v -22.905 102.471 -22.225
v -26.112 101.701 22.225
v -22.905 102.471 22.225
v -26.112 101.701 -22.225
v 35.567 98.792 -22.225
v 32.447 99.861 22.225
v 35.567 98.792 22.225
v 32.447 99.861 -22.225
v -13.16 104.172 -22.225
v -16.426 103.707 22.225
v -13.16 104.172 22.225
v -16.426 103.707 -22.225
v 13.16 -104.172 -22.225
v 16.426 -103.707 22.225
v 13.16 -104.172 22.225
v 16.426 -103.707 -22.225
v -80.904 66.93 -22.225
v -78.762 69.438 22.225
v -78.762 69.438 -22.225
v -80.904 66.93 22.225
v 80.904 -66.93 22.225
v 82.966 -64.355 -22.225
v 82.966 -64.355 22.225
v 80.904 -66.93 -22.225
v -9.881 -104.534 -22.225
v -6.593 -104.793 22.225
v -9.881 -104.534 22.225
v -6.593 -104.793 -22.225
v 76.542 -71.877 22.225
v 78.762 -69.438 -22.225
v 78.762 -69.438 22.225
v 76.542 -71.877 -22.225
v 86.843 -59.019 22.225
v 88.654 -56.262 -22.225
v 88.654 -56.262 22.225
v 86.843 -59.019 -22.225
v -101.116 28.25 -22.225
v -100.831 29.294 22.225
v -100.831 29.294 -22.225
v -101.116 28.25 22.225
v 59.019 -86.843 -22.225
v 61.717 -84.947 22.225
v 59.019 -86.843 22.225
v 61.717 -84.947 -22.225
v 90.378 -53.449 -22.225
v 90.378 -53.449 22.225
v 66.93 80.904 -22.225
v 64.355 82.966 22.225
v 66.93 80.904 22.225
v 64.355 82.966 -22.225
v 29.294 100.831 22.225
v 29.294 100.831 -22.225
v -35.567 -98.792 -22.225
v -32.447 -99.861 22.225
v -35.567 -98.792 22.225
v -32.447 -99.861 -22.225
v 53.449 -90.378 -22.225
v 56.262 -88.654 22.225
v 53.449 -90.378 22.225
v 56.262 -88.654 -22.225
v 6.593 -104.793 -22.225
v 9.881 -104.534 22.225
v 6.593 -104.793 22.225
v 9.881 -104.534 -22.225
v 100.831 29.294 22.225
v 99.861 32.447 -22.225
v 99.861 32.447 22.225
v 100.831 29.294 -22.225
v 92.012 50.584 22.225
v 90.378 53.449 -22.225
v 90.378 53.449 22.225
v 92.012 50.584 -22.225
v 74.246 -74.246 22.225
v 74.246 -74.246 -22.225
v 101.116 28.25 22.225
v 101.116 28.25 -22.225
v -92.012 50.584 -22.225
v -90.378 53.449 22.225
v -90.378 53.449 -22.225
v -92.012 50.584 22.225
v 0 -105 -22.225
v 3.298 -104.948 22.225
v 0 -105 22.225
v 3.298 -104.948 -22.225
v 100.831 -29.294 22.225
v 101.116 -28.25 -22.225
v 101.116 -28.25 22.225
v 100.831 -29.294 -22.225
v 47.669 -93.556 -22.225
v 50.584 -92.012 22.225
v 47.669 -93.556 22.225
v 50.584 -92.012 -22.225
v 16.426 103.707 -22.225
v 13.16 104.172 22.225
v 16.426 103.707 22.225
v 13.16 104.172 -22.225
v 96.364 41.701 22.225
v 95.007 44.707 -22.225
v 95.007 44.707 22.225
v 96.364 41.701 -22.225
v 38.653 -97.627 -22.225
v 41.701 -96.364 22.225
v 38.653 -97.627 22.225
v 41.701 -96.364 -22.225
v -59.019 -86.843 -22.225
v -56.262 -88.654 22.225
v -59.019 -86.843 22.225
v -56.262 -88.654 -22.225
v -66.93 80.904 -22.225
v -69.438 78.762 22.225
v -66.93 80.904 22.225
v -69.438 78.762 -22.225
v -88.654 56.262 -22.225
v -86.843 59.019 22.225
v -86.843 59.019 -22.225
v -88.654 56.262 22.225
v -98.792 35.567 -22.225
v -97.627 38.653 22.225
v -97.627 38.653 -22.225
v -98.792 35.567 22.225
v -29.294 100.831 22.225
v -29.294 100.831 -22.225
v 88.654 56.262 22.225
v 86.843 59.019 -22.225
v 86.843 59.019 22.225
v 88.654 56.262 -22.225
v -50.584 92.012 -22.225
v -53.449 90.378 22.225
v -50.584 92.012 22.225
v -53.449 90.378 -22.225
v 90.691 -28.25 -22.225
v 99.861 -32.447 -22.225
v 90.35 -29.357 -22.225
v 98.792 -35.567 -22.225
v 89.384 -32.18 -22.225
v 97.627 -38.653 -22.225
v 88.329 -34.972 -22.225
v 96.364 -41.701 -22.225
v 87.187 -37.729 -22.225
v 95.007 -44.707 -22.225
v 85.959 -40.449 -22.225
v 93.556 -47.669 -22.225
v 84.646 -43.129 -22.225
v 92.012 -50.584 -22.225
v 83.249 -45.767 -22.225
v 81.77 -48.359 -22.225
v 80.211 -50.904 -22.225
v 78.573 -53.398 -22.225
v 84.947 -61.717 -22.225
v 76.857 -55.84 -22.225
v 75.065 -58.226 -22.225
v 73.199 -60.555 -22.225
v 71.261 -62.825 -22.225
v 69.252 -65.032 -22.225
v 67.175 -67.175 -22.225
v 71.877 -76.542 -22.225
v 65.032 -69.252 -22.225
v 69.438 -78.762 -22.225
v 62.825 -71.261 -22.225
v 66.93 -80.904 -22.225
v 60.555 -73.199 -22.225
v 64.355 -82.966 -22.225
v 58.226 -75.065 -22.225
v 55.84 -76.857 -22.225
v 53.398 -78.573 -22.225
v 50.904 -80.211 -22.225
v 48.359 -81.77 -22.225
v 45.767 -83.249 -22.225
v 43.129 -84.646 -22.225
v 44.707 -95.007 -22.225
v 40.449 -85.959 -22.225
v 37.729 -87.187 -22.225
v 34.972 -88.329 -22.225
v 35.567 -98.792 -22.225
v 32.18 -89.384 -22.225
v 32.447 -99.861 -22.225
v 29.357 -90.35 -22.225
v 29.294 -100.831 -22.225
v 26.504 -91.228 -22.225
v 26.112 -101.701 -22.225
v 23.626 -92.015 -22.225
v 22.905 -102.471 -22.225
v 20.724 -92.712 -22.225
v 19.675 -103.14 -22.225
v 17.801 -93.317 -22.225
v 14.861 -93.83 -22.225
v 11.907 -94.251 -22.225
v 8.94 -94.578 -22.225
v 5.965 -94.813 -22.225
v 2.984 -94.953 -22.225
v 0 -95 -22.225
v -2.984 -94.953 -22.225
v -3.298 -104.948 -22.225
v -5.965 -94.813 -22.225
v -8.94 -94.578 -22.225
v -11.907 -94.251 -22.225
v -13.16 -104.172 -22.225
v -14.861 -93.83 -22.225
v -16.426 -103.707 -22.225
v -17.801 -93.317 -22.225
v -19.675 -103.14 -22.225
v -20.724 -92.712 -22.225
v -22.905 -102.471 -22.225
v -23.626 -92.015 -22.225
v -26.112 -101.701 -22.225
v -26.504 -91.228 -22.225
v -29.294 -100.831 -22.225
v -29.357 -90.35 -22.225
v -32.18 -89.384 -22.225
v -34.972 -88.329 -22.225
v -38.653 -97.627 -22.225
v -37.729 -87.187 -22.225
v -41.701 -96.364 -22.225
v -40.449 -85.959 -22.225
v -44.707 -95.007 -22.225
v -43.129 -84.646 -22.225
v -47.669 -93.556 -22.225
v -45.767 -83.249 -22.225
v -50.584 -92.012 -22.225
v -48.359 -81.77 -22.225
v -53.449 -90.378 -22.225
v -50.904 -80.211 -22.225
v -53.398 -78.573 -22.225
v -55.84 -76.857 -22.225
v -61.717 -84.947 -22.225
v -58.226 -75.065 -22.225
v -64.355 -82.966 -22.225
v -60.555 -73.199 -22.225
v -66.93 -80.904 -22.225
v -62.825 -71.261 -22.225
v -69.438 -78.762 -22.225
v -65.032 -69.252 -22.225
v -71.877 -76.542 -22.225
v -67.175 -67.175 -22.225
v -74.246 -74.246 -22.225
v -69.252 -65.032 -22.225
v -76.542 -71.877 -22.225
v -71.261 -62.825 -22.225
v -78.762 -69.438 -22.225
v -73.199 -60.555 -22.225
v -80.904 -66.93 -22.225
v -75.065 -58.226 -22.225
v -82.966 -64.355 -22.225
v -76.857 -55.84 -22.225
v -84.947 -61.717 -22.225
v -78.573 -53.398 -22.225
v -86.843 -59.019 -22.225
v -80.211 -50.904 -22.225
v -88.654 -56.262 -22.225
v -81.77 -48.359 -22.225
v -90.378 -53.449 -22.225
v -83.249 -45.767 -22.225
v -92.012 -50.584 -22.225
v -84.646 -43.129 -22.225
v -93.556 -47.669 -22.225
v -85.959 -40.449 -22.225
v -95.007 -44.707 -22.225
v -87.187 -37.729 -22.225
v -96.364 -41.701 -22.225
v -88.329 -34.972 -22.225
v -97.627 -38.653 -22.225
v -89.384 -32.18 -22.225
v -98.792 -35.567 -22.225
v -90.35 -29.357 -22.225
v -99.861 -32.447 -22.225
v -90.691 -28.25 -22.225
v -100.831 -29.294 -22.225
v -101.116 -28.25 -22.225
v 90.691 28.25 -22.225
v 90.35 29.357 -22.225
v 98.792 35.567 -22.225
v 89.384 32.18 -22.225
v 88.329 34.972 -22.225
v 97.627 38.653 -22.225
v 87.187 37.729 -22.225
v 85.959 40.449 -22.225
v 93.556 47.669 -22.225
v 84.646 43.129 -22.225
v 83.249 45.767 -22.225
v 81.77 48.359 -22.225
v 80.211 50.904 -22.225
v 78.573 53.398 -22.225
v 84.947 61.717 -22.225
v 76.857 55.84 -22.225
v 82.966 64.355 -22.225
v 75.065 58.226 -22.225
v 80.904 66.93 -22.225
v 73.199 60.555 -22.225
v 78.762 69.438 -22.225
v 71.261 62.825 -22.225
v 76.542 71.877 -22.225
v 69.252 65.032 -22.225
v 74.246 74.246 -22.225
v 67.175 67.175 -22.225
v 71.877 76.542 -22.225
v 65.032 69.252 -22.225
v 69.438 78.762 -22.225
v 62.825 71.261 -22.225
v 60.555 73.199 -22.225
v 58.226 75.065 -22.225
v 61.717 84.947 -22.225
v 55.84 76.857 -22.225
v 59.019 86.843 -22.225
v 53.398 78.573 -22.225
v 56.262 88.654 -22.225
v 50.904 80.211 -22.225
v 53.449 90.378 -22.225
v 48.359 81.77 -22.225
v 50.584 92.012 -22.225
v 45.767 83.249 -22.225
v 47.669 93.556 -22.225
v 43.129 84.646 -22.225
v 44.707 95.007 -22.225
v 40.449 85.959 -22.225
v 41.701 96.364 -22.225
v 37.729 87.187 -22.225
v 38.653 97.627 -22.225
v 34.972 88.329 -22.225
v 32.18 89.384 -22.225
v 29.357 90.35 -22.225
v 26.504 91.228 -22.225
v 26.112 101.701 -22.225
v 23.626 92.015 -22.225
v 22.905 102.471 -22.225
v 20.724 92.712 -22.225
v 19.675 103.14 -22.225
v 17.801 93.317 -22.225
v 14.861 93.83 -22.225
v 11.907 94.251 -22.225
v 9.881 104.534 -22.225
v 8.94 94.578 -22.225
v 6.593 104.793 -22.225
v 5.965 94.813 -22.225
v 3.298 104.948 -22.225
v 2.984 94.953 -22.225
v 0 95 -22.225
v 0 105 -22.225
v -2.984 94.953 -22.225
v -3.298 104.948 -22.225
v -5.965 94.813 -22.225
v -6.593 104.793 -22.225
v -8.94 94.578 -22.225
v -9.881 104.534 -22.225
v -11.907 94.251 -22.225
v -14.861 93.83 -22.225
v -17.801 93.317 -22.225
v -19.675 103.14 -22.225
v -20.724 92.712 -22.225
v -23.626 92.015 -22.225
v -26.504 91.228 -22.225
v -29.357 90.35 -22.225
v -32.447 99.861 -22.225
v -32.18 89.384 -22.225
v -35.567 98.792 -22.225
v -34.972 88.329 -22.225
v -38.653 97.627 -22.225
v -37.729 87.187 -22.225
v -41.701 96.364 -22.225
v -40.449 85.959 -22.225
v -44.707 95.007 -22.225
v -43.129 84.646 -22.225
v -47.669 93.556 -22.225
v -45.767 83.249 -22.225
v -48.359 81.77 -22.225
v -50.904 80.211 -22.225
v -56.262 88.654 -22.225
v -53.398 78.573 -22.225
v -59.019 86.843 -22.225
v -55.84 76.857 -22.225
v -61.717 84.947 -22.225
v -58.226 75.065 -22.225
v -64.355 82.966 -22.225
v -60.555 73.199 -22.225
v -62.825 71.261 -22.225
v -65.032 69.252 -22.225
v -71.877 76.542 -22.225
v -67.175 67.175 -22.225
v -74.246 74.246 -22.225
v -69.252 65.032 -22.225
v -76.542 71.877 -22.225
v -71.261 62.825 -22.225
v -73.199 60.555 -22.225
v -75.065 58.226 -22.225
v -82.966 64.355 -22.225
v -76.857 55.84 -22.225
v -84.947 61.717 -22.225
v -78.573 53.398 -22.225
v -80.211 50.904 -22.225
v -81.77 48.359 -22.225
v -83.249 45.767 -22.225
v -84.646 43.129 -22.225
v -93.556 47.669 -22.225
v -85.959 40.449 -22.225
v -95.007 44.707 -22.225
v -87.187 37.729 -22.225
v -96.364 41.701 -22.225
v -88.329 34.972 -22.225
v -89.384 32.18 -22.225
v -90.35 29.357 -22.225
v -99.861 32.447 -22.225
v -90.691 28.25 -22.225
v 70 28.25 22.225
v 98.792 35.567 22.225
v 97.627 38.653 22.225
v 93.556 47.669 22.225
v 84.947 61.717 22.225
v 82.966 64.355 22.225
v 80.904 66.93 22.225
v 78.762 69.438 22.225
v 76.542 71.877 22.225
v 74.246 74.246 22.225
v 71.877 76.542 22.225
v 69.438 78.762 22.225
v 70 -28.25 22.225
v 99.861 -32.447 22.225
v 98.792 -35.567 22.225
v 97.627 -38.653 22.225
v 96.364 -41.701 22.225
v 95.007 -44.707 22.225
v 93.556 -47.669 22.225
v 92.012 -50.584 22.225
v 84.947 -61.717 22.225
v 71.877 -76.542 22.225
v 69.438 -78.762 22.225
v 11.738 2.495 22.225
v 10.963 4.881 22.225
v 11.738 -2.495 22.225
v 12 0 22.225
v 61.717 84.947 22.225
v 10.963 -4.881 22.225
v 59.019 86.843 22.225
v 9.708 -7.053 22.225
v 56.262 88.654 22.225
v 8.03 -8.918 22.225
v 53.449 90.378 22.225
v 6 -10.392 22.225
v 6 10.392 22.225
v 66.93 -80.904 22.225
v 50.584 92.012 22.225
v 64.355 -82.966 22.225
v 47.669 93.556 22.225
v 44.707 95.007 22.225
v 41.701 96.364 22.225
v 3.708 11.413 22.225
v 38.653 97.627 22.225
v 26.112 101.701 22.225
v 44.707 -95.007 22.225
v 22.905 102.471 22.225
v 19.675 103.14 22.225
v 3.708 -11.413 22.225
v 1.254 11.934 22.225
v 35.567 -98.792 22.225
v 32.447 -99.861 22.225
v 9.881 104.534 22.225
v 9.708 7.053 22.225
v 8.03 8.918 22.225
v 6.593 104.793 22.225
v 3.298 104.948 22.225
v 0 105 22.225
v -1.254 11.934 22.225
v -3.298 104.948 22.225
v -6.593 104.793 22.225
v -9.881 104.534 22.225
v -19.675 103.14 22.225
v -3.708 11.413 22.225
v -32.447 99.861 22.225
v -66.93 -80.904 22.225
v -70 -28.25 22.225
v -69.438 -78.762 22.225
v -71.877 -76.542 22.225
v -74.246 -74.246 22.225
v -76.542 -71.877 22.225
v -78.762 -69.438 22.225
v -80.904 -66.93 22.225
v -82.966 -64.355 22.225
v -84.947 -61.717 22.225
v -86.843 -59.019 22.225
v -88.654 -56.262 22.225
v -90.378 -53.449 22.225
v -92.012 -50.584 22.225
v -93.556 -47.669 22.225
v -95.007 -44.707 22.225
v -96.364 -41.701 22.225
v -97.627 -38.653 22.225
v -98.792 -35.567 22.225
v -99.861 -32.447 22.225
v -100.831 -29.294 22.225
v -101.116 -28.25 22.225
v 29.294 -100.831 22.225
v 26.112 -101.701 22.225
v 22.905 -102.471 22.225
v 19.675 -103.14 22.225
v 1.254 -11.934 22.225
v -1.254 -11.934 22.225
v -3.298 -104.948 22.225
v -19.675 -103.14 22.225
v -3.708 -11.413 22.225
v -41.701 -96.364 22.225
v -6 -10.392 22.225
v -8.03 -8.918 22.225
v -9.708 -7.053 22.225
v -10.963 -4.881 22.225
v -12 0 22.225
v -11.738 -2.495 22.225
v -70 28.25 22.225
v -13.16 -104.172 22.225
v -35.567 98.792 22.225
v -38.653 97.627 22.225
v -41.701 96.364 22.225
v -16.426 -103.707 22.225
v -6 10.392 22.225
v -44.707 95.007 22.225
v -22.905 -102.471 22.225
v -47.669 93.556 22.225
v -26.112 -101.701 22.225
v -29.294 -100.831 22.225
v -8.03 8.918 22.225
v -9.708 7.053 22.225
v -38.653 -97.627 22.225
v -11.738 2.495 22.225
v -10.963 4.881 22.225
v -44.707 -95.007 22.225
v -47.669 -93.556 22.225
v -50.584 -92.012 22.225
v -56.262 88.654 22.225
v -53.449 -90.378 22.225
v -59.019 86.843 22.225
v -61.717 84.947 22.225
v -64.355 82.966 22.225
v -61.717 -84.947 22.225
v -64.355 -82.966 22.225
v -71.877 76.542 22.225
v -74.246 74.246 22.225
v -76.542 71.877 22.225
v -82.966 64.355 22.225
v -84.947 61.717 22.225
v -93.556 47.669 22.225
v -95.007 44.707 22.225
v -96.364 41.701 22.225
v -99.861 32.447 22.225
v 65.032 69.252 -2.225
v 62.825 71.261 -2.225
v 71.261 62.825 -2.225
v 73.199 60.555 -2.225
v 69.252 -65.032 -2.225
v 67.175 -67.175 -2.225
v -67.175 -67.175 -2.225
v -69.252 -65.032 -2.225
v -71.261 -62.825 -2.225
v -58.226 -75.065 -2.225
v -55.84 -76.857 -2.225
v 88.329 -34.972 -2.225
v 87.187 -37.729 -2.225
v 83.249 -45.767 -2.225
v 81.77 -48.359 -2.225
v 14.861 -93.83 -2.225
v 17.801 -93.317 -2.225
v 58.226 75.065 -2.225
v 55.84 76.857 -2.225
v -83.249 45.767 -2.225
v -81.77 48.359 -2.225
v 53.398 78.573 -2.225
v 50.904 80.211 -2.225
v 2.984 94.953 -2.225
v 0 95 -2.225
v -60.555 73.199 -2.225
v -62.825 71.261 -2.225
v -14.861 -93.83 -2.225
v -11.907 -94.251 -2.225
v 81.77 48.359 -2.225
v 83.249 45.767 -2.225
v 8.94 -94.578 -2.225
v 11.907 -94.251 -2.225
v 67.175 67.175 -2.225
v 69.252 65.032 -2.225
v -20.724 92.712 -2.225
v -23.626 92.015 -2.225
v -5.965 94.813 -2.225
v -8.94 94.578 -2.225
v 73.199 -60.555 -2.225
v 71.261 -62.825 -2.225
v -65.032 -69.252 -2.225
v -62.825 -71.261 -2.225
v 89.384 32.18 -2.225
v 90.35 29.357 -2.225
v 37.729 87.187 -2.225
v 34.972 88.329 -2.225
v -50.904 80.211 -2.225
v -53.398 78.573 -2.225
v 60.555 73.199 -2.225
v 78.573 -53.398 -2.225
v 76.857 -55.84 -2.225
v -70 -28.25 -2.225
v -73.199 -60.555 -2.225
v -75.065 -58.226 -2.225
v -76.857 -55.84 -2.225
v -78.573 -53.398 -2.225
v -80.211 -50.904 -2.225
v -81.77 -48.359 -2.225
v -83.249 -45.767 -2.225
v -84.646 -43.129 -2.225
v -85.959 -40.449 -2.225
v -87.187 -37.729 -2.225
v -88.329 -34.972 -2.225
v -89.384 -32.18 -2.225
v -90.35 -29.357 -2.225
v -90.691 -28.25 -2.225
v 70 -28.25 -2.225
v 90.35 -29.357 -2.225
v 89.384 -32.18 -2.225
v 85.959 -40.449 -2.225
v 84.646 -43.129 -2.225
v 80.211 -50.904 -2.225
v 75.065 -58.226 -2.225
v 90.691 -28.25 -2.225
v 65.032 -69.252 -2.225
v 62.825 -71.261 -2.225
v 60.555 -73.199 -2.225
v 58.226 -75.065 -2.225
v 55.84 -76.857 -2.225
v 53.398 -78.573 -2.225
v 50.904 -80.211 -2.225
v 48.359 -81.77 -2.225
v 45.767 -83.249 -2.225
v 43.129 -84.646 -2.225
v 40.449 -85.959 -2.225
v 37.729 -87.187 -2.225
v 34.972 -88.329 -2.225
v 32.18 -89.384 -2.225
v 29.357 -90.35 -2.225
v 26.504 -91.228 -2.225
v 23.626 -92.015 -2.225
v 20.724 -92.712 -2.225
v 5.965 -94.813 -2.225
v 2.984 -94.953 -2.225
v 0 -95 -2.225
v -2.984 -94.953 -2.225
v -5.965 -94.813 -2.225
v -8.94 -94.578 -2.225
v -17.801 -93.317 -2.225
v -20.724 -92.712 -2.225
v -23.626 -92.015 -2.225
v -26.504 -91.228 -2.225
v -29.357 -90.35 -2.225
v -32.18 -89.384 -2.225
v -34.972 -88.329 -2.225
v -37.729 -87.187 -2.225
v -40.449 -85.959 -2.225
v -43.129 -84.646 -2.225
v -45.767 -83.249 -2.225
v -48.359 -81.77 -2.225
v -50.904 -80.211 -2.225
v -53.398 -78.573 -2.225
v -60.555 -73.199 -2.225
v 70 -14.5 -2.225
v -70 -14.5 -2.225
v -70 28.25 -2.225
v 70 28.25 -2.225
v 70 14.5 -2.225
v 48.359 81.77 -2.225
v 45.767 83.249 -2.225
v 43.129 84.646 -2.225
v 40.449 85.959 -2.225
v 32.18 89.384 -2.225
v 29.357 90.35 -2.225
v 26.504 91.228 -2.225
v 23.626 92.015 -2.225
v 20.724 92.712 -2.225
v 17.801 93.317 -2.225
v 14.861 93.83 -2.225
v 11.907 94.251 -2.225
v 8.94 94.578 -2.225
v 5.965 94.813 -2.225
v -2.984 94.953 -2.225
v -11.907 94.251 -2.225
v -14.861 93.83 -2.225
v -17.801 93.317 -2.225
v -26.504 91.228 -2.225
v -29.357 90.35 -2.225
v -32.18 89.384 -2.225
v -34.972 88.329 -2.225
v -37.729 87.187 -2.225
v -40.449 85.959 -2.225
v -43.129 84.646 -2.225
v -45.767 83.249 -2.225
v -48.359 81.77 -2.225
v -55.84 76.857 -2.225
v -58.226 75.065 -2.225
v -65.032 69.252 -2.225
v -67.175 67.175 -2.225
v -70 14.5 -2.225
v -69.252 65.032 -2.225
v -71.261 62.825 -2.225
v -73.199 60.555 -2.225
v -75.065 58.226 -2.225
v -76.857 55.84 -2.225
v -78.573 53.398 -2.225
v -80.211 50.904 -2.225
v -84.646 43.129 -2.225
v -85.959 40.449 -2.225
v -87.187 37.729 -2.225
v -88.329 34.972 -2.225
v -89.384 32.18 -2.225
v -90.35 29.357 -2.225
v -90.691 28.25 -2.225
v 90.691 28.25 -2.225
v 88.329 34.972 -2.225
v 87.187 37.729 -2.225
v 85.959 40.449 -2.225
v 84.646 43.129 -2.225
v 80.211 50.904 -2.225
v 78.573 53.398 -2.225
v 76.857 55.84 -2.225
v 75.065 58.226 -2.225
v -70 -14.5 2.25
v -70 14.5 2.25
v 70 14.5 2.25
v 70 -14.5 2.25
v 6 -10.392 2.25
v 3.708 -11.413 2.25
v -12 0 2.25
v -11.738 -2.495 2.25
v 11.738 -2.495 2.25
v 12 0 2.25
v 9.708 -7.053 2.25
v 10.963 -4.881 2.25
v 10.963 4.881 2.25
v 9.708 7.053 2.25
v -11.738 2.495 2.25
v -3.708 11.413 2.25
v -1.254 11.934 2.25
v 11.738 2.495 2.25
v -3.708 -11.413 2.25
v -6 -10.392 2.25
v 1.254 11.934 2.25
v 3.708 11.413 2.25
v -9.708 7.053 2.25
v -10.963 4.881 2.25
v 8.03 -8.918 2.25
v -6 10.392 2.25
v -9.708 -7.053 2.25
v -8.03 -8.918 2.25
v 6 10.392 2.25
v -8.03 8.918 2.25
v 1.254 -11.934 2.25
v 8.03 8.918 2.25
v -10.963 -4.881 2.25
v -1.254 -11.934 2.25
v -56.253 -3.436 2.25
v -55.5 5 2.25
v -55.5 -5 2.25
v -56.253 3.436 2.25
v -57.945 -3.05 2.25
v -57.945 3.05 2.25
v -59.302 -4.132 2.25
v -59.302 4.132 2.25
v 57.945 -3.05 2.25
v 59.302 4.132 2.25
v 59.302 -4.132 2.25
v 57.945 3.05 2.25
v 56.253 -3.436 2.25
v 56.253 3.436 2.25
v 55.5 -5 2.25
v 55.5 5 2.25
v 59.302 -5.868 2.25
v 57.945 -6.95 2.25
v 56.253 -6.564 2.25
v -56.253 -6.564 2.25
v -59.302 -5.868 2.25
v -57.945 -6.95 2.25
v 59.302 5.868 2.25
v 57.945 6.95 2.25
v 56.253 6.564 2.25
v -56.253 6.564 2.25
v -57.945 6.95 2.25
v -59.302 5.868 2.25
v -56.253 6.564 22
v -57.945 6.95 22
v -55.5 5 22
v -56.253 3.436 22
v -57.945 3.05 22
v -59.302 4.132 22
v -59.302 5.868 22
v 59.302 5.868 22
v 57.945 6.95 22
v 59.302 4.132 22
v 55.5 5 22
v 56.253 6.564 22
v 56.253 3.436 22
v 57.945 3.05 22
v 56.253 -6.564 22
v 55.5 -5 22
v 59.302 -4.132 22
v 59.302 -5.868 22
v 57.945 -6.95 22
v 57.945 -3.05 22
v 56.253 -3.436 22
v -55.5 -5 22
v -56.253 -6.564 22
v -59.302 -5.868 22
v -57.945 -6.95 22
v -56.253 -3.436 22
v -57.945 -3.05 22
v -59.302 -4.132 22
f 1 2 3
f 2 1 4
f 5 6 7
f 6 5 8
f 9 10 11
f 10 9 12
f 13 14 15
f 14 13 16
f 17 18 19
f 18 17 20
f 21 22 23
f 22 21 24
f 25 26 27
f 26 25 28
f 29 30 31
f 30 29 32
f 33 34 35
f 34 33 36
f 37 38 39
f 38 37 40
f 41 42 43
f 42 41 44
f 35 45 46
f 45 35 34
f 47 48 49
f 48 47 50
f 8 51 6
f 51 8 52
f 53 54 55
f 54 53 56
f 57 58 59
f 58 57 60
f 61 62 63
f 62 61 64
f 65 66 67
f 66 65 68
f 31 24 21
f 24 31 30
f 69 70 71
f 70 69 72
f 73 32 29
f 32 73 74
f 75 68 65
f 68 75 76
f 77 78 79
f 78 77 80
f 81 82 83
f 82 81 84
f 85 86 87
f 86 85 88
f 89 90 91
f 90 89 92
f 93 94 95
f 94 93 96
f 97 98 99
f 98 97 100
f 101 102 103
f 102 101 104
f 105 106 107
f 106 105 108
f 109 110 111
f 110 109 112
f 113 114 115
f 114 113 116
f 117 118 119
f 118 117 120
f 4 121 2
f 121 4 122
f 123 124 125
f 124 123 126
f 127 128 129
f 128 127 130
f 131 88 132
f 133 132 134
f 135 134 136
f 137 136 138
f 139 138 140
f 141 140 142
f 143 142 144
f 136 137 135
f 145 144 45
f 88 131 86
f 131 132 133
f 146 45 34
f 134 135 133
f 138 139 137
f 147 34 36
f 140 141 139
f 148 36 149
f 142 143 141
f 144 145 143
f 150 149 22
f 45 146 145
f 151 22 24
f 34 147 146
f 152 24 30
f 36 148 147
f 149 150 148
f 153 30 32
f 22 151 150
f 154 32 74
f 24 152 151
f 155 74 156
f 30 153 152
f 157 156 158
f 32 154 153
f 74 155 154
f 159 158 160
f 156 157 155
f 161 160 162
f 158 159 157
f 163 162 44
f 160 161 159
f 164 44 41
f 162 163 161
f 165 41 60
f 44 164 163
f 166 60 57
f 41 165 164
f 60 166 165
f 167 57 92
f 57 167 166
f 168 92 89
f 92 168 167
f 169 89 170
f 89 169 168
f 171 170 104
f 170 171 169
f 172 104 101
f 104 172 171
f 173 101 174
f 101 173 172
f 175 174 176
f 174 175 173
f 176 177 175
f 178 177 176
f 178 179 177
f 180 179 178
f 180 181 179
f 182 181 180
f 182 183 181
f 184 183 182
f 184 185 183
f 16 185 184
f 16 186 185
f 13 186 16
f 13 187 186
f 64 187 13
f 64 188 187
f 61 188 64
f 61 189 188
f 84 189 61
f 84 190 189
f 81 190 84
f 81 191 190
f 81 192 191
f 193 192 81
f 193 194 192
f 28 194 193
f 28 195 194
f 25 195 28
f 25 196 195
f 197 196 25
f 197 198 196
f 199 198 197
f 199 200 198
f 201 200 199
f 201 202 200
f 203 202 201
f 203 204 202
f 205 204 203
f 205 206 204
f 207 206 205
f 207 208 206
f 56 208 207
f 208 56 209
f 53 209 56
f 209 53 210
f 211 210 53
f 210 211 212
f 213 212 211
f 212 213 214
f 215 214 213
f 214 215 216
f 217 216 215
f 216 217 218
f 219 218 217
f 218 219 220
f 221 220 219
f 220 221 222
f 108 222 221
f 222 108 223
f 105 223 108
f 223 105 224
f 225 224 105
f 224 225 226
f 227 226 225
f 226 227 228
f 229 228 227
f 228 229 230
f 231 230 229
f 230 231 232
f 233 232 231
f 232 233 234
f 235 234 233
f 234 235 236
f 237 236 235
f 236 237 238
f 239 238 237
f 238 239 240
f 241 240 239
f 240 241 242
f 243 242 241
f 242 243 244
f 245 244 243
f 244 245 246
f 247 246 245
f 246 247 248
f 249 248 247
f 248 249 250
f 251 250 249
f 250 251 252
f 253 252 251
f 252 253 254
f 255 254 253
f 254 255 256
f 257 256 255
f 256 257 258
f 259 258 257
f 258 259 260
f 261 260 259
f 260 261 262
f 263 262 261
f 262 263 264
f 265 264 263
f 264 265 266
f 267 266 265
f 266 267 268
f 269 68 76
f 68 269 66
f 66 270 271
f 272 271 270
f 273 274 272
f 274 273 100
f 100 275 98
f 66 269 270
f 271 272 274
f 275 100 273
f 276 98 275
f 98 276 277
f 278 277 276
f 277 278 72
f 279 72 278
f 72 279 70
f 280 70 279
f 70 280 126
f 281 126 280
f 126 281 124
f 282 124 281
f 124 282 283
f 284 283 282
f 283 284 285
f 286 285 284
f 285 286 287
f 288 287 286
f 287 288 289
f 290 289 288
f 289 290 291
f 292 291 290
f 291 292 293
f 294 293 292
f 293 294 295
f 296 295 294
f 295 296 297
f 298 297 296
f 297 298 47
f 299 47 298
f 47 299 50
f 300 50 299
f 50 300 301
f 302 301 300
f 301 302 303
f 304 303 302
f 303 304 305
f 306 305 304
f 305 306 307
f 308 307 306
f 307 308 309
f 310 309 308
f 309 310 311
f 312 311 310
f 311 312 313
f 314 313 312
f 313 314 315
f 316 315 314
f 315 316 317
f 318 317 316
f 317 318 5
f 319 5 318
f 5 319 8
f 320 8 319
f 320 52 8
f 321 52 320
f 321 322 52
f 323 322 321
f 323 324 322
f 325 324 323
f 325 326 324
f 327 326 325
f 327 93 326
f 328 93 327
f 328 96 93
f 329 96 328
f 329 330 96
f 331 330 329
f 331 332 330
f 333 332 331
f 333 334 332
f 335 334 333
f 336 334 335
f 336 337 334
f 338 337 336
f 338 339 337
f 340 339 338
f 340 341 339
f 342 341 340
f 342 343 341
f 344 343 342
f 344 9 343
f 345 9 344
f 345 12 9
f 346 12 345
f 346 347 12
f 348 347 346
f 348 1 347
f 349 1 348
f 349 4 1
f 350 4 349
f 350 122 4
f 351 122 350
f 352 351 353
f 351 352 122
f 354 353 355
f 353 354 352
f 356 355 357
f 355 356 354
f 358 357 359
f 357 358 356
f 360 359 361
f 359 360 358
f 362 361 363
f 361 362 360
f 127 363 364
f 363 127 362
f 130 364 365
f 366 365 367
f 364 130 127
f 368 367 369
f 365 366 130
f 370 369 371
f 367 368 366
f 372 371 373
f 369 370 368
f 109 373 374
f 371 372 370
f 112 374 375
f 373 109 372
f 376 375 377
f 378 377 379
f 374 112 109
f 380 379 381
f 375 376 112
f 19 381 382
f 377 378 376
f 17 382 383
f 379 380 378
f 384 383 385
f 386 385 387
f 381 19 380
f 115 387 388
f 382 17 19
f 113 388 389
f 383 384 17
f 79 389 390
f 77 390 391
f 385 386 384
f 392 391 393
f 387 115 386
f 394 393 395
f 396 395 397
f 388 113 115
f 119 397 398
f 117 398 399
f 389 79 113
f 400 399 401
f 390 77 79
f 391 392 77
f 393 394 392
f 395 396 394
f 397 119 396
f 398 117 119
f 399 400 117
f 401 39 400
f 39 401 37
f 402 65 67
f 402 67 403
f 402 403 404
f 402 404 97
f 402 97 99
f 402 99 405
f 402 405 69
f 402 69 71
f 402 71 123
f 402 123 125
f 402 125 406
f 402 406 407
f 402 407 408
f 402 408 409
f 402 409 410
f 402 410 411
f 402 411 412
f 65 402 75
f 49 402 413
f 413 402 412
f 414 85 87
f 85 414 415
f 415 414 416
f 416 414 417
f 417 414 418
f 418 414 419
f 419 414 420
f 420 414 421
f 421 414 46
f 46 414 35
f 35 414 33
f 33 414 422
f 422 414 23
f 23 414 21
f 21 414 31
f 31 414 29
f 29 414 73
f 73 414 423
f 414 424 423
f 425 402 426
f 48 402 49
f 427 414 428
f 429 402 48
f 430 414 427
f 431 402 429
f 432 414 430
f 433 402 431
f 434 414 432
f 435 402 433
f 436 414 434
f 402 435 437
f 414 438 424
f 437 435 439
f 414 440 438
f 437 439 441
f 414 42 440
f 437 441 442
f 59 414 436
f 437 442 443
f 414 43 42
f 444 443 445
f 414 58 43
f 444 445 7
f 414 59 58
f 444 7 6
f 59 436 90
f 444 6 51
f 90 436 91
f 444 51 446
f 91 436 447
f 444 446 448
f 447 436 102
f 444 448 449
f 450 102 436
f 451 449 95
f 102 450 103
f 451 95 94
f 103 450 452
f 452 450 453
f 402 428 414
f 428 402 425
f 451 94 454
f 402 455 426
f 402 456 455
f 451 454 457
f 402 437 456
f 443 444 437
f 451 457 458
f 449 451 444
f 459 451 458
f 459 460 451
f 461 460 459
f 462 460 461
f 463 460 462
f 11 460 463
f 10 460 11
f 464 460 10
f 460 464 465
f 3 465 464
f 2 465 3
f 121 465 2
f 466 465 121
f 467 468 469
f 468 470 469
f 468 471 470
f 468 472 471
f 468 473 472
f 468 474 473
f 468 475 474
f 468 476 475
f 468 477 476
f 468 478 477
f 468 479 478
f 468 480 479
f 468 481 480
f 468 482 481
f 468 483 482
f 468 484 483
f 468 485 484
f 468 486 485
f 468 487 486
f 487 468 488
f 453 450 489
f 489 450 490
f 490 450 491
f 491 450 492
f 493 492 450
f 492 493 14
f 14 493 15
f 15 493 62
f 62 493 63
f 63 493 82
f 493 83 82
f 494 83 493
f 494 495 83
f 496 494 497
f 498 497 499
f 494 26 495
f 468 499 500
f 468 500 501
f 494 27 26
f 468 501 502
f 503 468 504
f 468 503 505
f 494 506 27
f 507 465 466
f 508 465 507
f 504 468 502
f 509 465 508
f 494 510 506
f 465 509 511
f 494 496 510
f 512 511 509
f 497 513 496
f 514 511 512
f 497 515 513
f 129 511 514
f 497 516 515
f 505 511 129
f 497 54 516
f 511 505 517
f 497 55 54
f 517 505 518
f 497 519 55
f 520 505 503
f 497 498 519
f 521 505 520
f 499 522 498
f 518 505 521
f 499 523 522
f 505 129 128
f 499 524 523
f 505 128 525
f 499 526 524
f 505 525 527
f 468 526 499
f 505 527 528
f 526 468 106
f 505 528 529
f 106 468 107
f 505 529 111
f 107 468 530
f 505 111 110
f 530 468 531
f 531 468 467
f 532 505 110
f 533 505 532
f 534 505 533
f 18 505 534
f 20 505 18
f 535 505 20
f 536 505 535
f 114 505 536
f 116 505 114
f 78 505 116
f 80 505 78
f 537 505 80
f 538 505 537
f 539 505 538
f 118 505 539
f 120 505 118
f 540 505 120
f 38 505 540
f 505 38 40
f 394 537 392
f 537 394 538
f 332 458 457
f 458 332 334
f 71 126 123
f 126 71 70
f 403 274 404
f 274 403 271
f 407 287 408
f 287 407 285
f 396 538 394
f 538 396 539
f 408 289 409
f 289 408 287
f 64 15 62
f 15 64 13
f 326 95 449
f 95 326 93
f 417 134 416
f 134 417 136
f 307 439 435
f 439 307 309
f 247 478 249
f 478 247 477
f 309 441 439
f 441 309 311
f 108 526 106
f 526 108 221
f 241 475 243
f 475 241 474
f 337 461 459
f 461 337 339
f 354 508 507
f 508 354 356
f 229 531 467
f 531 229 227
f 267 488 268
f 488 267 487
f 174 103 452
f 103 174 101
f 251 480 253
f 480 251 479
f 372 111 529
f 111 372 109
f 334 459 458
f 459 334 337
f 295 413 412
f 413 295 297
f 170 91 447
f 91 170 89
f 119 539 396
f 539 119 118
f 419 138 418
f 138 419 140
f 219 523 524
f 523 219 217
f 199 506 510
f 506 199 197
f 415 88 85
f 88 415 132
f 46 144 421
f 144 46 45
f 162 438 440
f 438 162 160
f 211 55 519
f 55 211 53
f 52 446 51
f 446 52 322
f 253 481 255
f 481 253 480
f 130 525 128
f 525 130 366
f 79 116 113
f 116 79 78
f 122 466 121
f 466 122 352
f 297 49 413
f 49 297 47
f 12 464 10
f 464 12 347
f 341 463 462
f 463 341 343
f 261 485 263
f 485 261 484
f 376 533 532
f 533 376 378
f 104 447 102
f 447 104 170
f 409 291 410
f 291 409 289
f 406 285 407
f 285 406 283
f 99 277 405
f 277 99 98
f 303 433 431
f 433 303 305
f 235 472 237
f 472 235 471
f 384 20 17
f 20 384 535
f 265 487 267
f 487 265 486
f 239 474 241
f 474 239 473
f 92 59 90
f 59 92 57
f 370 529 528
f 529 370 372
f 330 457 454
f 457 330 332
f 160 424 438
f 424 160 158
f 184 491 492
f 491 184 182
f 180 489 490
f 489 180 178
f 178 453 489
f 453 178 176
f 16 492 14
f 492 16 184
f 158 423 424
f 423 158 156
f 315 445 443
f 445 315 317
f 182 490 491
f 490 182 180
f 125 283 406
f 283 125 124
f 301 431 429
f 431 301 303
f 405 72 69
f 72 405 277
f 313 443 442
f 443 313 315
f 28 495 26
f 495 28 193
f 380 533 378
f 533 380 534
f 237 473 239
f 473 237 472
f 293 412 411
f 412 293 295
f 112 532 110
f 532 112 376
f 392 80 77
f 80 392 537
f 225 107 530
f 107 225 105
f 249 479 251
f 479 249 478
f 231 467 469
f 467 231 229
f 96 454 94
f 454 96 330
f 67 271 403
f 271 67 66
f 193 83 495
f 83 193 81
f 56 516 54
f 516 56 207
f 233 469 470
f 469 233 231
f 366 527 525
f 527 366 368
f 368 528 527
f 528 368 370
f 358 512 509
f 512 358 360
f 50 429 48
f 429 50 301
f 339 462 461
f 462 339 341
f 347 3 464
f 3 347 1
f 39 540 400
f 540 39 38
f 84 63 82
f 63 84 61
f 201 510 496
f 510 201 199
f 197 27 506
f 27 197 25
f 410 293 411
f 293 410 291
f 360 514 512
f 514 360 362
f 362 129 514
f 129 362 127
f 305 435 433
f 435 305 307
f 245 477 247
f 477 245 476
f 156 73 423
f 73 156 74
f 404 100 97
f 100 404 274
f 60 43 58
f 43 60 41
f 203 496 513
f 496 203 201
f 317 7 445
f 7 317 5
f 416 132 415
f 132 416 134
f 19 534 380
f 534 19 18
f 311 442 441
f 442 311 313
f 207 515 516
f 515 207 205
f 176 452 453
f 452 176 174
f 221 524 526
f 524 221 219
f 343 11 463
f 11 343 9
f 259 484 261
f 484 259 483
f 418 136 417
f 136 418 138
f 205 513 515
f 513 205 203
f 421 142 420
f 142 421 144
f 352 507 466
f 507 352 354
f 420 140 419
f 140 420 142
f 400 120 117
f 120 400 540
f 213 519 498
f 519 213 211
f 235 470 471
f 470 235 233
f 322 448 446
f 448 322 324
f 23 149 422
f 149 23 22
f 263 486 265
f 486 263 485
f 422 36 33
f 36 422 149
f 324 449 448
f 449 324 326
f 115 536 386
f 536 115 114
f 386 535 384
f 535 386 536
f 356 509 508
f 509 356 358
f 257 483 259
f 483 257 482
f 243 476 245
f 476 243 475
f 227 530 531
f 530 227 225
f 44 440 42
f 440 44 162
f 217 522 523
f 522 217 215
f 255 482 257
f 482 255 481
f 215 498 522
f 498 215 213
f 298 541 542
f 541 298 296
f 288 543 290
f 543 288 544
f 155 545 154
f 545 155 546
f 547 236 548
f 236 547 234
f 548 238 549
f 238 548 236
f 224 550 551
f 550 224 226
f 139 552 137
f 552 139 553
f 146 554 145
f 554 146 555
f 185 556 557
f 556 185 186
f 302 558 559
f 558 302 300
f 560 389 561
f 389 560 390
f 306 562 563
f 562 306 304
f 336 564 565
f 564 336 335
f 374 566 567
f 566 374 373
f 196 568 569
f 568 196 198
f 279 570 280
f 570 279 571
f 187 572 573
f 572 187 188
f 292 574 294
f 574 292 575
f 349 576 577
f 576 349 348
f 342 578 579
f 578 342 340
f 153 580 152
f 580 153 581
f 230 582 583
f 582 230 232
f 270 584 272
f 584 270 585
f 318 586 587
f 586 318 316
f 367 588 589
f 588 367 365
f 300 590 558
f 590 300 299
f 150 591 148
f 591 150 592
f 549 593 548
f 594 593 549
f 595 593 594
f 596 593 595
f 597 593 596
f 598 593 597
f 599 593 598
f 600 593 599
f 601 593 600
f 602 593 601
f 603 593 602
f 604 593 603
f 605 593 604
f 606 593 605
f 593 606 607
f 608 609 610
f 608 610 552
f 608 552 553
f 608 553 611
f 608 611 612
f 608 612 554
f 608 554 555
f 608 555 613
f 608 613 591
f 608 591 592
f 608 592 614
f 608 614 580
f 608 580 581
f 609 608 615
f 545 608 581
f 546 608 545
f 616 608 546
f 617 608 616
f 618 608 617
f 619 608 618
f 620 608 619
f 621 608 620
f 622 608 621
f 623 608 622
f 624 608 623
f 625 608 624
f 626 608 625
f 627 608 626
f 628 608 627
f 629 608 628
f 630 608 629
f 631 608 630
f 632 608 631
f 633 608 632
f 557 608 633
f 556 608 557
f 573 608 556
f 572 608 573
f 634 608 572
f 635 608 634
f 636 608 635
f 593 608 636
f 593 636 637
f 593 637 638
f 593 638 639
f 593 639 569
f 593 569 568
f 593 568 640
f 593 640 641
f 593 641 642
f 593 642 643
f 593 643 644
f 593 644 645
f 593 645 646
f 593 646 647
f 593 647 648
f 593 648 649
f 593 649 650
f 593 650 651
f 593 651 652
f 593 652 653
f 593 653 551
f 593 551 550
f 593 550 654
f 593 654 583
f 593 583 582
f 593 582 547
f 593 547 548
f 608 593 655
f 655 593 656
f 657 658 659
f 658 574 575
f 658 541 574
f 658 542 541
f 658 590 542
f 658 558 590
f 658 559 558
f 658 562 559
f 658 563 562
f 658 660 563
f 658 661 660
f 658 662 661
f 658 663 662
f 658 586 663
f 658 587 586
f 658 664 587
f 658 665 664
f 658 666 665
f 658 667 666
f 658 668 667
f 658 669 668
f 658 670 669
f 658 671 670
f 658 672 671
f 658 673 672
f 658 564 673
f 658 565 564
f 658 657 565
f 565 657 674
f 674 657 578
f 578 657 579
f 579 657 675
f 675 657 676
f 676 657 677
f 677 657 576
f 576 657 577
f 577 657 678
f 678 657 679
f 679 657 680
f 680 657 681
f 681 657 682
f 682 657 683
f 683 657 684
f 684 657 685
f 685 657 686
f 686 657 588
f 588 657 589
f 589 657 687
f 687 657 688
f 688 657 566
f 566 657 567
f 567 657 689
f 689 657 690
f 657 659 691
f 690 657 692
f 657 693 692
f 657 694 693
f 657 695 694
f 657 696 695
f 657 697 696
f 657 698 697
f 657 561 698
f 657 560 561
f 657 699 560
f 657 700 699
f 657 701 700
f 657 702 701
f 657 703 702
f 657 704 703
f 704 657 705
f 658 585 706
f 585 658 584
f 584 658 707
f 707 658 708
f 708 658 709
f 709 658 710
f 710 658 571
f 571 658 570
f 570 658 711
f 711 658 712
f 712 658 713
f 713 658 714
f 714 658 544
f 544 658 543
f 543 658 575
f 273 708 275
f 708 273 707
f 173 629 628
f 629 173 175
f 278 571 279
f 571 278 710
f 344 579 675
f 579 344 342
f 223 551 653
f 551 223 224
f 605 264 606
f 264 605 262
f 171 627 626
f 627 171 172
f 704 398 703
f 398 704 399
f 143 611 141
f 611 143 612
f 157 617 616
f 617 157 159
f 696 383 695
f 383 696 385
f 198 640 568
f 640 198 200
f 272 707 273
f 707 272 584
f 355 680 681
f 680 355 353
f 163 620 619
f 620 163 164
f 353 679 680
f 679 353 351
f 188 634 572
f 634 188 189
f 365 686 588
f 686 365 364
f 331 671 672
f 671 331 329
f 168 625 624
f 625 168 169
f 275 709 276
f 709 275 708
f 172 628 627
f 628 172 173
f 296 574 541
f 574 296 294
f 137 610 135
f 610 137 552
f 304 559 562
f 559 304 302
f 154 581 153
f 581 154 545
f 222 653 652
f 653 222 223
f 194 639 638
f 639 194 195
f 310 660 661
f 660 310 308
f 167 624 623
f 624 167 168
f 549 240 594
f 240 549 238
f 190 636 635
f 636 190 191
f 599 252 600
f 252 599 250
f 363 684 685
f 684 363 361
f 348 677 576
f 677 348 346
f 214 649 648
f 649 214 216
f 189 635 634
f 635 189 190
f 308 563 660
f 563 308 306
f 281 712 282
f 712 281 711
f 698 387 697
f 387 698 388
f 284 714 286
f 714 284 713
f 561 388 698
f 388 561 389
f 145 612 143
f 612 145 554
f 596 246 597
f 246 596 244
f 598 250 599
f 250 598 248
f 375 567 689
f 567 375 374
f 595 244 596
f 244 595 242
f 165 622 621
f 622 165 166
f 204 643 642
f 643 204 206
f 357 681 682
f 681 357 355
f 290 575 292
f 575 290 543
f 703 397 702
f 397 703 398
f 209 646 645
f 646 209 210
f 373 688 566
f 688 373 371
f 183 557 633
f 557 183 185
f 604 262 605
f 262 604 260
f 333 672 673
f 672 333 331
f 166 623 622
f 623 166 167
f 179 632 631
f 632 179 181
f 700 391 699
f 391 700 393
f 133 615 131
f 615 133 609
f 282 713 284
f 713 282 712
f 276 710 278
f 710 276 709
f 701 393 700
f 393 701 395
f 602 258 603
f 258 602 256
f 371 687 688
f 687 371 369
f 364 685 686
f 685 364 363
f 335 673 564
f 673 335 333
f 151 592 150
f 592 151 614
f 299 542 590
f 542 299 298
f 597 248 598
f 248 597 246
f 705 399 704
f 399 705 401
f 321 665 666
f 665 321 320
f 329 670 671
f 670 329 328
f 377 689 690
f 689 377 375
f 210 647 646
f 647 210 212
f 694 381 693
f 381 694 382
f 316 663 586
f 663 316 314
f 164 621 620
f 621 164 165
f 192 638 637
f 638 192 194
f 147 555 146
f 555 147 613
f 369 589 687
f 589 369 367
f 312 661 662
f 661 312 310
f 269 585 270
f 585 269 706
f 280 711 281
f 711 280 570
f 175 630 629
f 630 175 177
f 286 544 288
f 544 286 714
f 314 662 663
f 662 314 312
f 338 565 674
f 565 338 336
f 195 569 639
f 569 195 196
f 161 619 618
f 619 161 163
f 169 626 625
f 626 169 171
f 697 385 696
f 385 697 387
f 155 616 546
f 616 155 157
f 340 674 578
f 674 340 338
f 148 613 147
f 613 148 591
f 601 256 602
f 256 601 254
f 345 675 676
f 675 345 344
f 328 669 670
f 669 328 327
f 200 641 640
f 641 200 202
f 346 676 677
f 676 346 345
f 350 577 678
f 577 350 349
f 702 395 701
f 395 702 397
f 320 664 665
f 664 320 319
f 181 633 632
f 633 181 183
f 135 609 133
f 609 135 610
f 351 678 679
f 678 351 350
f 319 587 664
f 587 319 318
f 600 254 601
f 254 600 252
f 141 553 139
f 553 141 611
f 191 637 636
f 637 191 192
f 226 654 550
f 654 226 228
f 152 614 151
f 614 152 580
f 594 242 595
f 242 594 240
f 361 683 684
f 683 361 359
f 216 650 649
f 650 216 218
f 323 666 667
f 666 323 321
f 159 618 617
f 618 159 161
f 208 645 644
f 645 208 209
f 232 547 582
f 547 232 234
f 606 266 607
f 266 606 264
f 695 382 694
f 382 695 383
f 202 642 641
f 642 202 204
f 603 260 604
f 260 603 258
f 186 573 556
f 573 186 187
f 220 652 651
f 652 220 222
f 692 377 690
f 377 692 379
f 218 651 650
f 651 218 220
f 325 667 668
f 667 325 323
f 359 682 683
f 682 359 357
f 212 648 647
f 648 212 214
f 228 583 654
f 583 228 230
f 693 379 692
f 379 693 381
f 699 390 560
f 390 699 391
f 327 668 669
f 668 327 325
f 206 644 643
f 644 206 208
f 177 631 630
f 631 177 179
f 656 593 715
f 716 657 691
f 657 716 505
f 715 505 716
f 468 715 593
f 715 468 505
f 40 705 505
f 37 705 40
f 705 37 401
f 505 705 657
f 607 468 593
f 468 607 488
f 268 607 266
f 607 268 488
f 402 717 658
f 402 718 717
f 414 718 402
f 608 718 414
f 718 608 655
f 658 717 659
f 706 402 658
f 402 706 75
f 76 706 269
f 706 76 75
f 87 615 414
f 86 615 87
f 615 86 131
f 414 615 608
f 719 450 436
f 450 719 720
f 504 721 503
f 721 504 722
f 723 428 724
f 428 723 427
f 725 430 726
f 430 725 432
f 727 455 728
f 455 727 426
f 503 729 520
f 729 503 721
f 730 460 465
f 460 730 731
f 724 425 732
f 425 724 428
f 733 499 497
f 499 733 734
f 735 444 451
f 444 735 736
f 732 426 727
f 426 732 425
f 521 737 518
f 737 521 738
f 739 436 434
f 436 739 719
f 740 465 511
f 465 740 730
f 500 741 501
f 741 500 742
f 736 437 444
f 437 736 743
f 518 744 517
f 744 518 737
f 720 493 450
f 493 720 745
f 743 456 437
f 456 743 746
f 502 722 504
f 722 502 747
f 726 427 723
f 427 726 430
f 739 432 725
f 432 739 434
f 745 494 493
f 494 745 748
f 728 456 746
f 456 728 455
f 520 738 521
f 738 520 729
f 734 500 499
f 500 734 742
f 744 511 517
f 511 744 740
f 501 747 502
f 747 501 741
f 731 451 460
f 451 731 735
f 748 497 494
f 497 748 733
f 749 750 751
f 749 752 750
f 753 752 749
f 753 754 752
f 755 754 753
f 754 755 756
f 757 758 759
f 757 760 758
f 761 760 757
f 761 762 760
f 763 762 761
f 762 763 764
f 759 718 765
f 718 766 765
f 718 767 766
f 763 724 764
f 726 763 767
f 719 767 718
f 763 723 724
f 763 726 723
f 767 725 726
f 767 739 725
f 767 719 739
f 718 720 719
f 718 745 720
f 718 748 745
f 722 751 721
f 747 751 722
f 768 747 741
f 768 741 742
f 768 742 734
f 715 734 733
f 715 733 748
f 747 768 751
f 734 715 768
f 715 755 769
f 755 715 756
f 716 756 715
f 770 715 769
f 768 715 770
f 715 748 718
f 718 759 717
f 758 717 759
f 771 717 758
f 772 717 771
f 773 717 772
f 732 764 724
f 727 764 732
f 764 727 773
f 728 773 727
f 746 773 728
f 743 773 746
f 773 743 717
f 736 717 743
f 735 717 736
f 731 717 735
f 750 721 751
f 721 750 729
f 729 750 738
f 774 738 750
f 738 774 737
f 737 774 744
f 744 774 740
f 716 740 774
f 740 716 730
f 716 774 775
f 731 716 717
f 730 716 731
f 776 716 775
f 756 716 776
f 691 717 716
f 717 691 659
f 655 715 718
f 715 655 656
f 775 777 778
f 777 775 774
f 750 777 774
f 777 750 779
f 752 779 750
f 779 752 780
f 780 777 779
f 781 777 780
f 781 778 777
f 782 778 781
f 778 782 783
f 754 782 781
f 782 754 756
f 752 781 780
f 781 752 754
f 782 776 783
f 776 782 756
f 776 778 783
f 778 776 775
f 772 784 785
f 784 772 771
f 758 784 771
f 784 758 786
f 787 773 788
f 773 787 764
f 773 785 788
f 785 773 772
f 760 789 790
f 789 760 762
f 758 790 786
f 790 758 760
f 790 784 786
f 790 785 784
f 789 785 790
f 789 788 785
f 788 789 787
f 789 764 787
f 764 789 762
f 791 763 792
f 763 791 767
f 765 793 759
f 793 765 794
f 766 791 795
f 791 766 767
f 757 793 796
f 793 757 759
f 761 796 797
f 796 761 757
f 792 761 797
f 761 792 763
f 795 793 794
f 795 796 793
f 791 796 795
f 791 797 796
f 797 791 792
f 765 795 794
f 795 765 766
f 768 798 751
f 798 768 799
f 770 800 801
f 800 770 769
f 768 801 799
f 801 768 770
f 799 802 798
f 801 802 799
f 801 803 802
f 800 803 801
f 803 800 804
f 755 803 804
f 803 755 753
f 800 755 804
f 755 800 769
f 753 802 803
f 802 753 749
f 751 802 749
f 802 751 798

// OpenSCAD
/*module wheel_well(x, y, z, length, width, height)
{
    translate([x, y, z])
    cube(size = [length, width, height], center = false);
}*/


//main body
difference(){
    cylinder(r = 105, h = 44.45, $fn = 200, center = true);
    //cylinder(44.45,77,77,true);
    difference(){
    //big center hole  
    translate([0, 0, -24.45])
    cylinder(r=95, h=44.45, $fn = 200, center = true);

    }
     //wheel wells L
    //wheel_well(-103, -28.25, -45.675, 43, 56.5, 100);
    translate([-113, -28.25, -45.675])
    cube([43,56.5,100], false);
    //wheel wells R
    mirror([1,0,0])
   {
       translate([-113, -28.25, -45.675])
    cube([43,56.5,100], false);
       }
    /*translate([60, -28.25, -45.675])
    cube([43,56.5,100], false);*/
    /* square hole in middle
    translate([0,0,-22.225])
        cube([101.6,101.6,44.45], true);
    //square extension L
    translate([-60, -25, -44.45])
    cube([55,50,50], false);
    //square extension R
    translate([5, -25, -44.45])
        cube([55,50,50], false);
    /*space for motor cord right
    translate([5, -20, -44.45])
        cube([5,40, 88.9], false);
    //space for motor cord left
    translate([-10, -20, -44.45])
        cube([5,40, 88.9], false);*/
    //another hole in the middle
    //cube([70,50,45], true);
    /*hole 1 in corner
    translate([-38, -38, 0])
        cylinder(500, 12, 12, true);
    //hole 2 in corner
    translate([-38, 38, 0])
        cylinder(500, 12, 12, true);
    //hole 3 in corner
    translate([38, -38, 0])
        cylinder(500, 12, 12, true);
    //hole 4 in corner
    translate([38, 38, 0])
        cylinder(500, 12, 12, true);*/
    //hole in center
    translate([0, 0, 0])
        cylinder(500, 12, 12, true);
    //motor mount area 
    cube([163, 29, 4.5], true); 
    //screw hole positive
    translate([-57.5, 5,-3]) 
    cylinder(50, 2, 2, true);
    mirror([1,0,0])
    {
        translate([-57.5, 5,-3]) 
    cylinder(50, 2, 2, true);
    }
    //screw hole negetive
    mirror([0,1,0])
   { 
    mirror([1,0,0])
    {
        translate([-57.5, 5,-3]) 
    cylinder(50, 2, 2, true);
    }
}
    mirror([0,1,0])
    {
        translate([-57.5, 5,-3]) 
    cylinder(50, 2, 2, true);
    }
}

/*controller
    translate([0,0,44.45])
        cube([101.6,101.6,44.45], true);*/
/*camera
translate([0,76.8,44.45])
        cylinder(r=26, h=44.45, $fn = 200, center = true);*/
/*main motor left
rotate([0,90,0])
    translate([15, 0, -38.5])
cylinder(43, 7, 7, true);
//main motor right
rotate([0,90,0])
    translate([15, 0, 38.5])
cylinder(43, 7, 7, true);*/
